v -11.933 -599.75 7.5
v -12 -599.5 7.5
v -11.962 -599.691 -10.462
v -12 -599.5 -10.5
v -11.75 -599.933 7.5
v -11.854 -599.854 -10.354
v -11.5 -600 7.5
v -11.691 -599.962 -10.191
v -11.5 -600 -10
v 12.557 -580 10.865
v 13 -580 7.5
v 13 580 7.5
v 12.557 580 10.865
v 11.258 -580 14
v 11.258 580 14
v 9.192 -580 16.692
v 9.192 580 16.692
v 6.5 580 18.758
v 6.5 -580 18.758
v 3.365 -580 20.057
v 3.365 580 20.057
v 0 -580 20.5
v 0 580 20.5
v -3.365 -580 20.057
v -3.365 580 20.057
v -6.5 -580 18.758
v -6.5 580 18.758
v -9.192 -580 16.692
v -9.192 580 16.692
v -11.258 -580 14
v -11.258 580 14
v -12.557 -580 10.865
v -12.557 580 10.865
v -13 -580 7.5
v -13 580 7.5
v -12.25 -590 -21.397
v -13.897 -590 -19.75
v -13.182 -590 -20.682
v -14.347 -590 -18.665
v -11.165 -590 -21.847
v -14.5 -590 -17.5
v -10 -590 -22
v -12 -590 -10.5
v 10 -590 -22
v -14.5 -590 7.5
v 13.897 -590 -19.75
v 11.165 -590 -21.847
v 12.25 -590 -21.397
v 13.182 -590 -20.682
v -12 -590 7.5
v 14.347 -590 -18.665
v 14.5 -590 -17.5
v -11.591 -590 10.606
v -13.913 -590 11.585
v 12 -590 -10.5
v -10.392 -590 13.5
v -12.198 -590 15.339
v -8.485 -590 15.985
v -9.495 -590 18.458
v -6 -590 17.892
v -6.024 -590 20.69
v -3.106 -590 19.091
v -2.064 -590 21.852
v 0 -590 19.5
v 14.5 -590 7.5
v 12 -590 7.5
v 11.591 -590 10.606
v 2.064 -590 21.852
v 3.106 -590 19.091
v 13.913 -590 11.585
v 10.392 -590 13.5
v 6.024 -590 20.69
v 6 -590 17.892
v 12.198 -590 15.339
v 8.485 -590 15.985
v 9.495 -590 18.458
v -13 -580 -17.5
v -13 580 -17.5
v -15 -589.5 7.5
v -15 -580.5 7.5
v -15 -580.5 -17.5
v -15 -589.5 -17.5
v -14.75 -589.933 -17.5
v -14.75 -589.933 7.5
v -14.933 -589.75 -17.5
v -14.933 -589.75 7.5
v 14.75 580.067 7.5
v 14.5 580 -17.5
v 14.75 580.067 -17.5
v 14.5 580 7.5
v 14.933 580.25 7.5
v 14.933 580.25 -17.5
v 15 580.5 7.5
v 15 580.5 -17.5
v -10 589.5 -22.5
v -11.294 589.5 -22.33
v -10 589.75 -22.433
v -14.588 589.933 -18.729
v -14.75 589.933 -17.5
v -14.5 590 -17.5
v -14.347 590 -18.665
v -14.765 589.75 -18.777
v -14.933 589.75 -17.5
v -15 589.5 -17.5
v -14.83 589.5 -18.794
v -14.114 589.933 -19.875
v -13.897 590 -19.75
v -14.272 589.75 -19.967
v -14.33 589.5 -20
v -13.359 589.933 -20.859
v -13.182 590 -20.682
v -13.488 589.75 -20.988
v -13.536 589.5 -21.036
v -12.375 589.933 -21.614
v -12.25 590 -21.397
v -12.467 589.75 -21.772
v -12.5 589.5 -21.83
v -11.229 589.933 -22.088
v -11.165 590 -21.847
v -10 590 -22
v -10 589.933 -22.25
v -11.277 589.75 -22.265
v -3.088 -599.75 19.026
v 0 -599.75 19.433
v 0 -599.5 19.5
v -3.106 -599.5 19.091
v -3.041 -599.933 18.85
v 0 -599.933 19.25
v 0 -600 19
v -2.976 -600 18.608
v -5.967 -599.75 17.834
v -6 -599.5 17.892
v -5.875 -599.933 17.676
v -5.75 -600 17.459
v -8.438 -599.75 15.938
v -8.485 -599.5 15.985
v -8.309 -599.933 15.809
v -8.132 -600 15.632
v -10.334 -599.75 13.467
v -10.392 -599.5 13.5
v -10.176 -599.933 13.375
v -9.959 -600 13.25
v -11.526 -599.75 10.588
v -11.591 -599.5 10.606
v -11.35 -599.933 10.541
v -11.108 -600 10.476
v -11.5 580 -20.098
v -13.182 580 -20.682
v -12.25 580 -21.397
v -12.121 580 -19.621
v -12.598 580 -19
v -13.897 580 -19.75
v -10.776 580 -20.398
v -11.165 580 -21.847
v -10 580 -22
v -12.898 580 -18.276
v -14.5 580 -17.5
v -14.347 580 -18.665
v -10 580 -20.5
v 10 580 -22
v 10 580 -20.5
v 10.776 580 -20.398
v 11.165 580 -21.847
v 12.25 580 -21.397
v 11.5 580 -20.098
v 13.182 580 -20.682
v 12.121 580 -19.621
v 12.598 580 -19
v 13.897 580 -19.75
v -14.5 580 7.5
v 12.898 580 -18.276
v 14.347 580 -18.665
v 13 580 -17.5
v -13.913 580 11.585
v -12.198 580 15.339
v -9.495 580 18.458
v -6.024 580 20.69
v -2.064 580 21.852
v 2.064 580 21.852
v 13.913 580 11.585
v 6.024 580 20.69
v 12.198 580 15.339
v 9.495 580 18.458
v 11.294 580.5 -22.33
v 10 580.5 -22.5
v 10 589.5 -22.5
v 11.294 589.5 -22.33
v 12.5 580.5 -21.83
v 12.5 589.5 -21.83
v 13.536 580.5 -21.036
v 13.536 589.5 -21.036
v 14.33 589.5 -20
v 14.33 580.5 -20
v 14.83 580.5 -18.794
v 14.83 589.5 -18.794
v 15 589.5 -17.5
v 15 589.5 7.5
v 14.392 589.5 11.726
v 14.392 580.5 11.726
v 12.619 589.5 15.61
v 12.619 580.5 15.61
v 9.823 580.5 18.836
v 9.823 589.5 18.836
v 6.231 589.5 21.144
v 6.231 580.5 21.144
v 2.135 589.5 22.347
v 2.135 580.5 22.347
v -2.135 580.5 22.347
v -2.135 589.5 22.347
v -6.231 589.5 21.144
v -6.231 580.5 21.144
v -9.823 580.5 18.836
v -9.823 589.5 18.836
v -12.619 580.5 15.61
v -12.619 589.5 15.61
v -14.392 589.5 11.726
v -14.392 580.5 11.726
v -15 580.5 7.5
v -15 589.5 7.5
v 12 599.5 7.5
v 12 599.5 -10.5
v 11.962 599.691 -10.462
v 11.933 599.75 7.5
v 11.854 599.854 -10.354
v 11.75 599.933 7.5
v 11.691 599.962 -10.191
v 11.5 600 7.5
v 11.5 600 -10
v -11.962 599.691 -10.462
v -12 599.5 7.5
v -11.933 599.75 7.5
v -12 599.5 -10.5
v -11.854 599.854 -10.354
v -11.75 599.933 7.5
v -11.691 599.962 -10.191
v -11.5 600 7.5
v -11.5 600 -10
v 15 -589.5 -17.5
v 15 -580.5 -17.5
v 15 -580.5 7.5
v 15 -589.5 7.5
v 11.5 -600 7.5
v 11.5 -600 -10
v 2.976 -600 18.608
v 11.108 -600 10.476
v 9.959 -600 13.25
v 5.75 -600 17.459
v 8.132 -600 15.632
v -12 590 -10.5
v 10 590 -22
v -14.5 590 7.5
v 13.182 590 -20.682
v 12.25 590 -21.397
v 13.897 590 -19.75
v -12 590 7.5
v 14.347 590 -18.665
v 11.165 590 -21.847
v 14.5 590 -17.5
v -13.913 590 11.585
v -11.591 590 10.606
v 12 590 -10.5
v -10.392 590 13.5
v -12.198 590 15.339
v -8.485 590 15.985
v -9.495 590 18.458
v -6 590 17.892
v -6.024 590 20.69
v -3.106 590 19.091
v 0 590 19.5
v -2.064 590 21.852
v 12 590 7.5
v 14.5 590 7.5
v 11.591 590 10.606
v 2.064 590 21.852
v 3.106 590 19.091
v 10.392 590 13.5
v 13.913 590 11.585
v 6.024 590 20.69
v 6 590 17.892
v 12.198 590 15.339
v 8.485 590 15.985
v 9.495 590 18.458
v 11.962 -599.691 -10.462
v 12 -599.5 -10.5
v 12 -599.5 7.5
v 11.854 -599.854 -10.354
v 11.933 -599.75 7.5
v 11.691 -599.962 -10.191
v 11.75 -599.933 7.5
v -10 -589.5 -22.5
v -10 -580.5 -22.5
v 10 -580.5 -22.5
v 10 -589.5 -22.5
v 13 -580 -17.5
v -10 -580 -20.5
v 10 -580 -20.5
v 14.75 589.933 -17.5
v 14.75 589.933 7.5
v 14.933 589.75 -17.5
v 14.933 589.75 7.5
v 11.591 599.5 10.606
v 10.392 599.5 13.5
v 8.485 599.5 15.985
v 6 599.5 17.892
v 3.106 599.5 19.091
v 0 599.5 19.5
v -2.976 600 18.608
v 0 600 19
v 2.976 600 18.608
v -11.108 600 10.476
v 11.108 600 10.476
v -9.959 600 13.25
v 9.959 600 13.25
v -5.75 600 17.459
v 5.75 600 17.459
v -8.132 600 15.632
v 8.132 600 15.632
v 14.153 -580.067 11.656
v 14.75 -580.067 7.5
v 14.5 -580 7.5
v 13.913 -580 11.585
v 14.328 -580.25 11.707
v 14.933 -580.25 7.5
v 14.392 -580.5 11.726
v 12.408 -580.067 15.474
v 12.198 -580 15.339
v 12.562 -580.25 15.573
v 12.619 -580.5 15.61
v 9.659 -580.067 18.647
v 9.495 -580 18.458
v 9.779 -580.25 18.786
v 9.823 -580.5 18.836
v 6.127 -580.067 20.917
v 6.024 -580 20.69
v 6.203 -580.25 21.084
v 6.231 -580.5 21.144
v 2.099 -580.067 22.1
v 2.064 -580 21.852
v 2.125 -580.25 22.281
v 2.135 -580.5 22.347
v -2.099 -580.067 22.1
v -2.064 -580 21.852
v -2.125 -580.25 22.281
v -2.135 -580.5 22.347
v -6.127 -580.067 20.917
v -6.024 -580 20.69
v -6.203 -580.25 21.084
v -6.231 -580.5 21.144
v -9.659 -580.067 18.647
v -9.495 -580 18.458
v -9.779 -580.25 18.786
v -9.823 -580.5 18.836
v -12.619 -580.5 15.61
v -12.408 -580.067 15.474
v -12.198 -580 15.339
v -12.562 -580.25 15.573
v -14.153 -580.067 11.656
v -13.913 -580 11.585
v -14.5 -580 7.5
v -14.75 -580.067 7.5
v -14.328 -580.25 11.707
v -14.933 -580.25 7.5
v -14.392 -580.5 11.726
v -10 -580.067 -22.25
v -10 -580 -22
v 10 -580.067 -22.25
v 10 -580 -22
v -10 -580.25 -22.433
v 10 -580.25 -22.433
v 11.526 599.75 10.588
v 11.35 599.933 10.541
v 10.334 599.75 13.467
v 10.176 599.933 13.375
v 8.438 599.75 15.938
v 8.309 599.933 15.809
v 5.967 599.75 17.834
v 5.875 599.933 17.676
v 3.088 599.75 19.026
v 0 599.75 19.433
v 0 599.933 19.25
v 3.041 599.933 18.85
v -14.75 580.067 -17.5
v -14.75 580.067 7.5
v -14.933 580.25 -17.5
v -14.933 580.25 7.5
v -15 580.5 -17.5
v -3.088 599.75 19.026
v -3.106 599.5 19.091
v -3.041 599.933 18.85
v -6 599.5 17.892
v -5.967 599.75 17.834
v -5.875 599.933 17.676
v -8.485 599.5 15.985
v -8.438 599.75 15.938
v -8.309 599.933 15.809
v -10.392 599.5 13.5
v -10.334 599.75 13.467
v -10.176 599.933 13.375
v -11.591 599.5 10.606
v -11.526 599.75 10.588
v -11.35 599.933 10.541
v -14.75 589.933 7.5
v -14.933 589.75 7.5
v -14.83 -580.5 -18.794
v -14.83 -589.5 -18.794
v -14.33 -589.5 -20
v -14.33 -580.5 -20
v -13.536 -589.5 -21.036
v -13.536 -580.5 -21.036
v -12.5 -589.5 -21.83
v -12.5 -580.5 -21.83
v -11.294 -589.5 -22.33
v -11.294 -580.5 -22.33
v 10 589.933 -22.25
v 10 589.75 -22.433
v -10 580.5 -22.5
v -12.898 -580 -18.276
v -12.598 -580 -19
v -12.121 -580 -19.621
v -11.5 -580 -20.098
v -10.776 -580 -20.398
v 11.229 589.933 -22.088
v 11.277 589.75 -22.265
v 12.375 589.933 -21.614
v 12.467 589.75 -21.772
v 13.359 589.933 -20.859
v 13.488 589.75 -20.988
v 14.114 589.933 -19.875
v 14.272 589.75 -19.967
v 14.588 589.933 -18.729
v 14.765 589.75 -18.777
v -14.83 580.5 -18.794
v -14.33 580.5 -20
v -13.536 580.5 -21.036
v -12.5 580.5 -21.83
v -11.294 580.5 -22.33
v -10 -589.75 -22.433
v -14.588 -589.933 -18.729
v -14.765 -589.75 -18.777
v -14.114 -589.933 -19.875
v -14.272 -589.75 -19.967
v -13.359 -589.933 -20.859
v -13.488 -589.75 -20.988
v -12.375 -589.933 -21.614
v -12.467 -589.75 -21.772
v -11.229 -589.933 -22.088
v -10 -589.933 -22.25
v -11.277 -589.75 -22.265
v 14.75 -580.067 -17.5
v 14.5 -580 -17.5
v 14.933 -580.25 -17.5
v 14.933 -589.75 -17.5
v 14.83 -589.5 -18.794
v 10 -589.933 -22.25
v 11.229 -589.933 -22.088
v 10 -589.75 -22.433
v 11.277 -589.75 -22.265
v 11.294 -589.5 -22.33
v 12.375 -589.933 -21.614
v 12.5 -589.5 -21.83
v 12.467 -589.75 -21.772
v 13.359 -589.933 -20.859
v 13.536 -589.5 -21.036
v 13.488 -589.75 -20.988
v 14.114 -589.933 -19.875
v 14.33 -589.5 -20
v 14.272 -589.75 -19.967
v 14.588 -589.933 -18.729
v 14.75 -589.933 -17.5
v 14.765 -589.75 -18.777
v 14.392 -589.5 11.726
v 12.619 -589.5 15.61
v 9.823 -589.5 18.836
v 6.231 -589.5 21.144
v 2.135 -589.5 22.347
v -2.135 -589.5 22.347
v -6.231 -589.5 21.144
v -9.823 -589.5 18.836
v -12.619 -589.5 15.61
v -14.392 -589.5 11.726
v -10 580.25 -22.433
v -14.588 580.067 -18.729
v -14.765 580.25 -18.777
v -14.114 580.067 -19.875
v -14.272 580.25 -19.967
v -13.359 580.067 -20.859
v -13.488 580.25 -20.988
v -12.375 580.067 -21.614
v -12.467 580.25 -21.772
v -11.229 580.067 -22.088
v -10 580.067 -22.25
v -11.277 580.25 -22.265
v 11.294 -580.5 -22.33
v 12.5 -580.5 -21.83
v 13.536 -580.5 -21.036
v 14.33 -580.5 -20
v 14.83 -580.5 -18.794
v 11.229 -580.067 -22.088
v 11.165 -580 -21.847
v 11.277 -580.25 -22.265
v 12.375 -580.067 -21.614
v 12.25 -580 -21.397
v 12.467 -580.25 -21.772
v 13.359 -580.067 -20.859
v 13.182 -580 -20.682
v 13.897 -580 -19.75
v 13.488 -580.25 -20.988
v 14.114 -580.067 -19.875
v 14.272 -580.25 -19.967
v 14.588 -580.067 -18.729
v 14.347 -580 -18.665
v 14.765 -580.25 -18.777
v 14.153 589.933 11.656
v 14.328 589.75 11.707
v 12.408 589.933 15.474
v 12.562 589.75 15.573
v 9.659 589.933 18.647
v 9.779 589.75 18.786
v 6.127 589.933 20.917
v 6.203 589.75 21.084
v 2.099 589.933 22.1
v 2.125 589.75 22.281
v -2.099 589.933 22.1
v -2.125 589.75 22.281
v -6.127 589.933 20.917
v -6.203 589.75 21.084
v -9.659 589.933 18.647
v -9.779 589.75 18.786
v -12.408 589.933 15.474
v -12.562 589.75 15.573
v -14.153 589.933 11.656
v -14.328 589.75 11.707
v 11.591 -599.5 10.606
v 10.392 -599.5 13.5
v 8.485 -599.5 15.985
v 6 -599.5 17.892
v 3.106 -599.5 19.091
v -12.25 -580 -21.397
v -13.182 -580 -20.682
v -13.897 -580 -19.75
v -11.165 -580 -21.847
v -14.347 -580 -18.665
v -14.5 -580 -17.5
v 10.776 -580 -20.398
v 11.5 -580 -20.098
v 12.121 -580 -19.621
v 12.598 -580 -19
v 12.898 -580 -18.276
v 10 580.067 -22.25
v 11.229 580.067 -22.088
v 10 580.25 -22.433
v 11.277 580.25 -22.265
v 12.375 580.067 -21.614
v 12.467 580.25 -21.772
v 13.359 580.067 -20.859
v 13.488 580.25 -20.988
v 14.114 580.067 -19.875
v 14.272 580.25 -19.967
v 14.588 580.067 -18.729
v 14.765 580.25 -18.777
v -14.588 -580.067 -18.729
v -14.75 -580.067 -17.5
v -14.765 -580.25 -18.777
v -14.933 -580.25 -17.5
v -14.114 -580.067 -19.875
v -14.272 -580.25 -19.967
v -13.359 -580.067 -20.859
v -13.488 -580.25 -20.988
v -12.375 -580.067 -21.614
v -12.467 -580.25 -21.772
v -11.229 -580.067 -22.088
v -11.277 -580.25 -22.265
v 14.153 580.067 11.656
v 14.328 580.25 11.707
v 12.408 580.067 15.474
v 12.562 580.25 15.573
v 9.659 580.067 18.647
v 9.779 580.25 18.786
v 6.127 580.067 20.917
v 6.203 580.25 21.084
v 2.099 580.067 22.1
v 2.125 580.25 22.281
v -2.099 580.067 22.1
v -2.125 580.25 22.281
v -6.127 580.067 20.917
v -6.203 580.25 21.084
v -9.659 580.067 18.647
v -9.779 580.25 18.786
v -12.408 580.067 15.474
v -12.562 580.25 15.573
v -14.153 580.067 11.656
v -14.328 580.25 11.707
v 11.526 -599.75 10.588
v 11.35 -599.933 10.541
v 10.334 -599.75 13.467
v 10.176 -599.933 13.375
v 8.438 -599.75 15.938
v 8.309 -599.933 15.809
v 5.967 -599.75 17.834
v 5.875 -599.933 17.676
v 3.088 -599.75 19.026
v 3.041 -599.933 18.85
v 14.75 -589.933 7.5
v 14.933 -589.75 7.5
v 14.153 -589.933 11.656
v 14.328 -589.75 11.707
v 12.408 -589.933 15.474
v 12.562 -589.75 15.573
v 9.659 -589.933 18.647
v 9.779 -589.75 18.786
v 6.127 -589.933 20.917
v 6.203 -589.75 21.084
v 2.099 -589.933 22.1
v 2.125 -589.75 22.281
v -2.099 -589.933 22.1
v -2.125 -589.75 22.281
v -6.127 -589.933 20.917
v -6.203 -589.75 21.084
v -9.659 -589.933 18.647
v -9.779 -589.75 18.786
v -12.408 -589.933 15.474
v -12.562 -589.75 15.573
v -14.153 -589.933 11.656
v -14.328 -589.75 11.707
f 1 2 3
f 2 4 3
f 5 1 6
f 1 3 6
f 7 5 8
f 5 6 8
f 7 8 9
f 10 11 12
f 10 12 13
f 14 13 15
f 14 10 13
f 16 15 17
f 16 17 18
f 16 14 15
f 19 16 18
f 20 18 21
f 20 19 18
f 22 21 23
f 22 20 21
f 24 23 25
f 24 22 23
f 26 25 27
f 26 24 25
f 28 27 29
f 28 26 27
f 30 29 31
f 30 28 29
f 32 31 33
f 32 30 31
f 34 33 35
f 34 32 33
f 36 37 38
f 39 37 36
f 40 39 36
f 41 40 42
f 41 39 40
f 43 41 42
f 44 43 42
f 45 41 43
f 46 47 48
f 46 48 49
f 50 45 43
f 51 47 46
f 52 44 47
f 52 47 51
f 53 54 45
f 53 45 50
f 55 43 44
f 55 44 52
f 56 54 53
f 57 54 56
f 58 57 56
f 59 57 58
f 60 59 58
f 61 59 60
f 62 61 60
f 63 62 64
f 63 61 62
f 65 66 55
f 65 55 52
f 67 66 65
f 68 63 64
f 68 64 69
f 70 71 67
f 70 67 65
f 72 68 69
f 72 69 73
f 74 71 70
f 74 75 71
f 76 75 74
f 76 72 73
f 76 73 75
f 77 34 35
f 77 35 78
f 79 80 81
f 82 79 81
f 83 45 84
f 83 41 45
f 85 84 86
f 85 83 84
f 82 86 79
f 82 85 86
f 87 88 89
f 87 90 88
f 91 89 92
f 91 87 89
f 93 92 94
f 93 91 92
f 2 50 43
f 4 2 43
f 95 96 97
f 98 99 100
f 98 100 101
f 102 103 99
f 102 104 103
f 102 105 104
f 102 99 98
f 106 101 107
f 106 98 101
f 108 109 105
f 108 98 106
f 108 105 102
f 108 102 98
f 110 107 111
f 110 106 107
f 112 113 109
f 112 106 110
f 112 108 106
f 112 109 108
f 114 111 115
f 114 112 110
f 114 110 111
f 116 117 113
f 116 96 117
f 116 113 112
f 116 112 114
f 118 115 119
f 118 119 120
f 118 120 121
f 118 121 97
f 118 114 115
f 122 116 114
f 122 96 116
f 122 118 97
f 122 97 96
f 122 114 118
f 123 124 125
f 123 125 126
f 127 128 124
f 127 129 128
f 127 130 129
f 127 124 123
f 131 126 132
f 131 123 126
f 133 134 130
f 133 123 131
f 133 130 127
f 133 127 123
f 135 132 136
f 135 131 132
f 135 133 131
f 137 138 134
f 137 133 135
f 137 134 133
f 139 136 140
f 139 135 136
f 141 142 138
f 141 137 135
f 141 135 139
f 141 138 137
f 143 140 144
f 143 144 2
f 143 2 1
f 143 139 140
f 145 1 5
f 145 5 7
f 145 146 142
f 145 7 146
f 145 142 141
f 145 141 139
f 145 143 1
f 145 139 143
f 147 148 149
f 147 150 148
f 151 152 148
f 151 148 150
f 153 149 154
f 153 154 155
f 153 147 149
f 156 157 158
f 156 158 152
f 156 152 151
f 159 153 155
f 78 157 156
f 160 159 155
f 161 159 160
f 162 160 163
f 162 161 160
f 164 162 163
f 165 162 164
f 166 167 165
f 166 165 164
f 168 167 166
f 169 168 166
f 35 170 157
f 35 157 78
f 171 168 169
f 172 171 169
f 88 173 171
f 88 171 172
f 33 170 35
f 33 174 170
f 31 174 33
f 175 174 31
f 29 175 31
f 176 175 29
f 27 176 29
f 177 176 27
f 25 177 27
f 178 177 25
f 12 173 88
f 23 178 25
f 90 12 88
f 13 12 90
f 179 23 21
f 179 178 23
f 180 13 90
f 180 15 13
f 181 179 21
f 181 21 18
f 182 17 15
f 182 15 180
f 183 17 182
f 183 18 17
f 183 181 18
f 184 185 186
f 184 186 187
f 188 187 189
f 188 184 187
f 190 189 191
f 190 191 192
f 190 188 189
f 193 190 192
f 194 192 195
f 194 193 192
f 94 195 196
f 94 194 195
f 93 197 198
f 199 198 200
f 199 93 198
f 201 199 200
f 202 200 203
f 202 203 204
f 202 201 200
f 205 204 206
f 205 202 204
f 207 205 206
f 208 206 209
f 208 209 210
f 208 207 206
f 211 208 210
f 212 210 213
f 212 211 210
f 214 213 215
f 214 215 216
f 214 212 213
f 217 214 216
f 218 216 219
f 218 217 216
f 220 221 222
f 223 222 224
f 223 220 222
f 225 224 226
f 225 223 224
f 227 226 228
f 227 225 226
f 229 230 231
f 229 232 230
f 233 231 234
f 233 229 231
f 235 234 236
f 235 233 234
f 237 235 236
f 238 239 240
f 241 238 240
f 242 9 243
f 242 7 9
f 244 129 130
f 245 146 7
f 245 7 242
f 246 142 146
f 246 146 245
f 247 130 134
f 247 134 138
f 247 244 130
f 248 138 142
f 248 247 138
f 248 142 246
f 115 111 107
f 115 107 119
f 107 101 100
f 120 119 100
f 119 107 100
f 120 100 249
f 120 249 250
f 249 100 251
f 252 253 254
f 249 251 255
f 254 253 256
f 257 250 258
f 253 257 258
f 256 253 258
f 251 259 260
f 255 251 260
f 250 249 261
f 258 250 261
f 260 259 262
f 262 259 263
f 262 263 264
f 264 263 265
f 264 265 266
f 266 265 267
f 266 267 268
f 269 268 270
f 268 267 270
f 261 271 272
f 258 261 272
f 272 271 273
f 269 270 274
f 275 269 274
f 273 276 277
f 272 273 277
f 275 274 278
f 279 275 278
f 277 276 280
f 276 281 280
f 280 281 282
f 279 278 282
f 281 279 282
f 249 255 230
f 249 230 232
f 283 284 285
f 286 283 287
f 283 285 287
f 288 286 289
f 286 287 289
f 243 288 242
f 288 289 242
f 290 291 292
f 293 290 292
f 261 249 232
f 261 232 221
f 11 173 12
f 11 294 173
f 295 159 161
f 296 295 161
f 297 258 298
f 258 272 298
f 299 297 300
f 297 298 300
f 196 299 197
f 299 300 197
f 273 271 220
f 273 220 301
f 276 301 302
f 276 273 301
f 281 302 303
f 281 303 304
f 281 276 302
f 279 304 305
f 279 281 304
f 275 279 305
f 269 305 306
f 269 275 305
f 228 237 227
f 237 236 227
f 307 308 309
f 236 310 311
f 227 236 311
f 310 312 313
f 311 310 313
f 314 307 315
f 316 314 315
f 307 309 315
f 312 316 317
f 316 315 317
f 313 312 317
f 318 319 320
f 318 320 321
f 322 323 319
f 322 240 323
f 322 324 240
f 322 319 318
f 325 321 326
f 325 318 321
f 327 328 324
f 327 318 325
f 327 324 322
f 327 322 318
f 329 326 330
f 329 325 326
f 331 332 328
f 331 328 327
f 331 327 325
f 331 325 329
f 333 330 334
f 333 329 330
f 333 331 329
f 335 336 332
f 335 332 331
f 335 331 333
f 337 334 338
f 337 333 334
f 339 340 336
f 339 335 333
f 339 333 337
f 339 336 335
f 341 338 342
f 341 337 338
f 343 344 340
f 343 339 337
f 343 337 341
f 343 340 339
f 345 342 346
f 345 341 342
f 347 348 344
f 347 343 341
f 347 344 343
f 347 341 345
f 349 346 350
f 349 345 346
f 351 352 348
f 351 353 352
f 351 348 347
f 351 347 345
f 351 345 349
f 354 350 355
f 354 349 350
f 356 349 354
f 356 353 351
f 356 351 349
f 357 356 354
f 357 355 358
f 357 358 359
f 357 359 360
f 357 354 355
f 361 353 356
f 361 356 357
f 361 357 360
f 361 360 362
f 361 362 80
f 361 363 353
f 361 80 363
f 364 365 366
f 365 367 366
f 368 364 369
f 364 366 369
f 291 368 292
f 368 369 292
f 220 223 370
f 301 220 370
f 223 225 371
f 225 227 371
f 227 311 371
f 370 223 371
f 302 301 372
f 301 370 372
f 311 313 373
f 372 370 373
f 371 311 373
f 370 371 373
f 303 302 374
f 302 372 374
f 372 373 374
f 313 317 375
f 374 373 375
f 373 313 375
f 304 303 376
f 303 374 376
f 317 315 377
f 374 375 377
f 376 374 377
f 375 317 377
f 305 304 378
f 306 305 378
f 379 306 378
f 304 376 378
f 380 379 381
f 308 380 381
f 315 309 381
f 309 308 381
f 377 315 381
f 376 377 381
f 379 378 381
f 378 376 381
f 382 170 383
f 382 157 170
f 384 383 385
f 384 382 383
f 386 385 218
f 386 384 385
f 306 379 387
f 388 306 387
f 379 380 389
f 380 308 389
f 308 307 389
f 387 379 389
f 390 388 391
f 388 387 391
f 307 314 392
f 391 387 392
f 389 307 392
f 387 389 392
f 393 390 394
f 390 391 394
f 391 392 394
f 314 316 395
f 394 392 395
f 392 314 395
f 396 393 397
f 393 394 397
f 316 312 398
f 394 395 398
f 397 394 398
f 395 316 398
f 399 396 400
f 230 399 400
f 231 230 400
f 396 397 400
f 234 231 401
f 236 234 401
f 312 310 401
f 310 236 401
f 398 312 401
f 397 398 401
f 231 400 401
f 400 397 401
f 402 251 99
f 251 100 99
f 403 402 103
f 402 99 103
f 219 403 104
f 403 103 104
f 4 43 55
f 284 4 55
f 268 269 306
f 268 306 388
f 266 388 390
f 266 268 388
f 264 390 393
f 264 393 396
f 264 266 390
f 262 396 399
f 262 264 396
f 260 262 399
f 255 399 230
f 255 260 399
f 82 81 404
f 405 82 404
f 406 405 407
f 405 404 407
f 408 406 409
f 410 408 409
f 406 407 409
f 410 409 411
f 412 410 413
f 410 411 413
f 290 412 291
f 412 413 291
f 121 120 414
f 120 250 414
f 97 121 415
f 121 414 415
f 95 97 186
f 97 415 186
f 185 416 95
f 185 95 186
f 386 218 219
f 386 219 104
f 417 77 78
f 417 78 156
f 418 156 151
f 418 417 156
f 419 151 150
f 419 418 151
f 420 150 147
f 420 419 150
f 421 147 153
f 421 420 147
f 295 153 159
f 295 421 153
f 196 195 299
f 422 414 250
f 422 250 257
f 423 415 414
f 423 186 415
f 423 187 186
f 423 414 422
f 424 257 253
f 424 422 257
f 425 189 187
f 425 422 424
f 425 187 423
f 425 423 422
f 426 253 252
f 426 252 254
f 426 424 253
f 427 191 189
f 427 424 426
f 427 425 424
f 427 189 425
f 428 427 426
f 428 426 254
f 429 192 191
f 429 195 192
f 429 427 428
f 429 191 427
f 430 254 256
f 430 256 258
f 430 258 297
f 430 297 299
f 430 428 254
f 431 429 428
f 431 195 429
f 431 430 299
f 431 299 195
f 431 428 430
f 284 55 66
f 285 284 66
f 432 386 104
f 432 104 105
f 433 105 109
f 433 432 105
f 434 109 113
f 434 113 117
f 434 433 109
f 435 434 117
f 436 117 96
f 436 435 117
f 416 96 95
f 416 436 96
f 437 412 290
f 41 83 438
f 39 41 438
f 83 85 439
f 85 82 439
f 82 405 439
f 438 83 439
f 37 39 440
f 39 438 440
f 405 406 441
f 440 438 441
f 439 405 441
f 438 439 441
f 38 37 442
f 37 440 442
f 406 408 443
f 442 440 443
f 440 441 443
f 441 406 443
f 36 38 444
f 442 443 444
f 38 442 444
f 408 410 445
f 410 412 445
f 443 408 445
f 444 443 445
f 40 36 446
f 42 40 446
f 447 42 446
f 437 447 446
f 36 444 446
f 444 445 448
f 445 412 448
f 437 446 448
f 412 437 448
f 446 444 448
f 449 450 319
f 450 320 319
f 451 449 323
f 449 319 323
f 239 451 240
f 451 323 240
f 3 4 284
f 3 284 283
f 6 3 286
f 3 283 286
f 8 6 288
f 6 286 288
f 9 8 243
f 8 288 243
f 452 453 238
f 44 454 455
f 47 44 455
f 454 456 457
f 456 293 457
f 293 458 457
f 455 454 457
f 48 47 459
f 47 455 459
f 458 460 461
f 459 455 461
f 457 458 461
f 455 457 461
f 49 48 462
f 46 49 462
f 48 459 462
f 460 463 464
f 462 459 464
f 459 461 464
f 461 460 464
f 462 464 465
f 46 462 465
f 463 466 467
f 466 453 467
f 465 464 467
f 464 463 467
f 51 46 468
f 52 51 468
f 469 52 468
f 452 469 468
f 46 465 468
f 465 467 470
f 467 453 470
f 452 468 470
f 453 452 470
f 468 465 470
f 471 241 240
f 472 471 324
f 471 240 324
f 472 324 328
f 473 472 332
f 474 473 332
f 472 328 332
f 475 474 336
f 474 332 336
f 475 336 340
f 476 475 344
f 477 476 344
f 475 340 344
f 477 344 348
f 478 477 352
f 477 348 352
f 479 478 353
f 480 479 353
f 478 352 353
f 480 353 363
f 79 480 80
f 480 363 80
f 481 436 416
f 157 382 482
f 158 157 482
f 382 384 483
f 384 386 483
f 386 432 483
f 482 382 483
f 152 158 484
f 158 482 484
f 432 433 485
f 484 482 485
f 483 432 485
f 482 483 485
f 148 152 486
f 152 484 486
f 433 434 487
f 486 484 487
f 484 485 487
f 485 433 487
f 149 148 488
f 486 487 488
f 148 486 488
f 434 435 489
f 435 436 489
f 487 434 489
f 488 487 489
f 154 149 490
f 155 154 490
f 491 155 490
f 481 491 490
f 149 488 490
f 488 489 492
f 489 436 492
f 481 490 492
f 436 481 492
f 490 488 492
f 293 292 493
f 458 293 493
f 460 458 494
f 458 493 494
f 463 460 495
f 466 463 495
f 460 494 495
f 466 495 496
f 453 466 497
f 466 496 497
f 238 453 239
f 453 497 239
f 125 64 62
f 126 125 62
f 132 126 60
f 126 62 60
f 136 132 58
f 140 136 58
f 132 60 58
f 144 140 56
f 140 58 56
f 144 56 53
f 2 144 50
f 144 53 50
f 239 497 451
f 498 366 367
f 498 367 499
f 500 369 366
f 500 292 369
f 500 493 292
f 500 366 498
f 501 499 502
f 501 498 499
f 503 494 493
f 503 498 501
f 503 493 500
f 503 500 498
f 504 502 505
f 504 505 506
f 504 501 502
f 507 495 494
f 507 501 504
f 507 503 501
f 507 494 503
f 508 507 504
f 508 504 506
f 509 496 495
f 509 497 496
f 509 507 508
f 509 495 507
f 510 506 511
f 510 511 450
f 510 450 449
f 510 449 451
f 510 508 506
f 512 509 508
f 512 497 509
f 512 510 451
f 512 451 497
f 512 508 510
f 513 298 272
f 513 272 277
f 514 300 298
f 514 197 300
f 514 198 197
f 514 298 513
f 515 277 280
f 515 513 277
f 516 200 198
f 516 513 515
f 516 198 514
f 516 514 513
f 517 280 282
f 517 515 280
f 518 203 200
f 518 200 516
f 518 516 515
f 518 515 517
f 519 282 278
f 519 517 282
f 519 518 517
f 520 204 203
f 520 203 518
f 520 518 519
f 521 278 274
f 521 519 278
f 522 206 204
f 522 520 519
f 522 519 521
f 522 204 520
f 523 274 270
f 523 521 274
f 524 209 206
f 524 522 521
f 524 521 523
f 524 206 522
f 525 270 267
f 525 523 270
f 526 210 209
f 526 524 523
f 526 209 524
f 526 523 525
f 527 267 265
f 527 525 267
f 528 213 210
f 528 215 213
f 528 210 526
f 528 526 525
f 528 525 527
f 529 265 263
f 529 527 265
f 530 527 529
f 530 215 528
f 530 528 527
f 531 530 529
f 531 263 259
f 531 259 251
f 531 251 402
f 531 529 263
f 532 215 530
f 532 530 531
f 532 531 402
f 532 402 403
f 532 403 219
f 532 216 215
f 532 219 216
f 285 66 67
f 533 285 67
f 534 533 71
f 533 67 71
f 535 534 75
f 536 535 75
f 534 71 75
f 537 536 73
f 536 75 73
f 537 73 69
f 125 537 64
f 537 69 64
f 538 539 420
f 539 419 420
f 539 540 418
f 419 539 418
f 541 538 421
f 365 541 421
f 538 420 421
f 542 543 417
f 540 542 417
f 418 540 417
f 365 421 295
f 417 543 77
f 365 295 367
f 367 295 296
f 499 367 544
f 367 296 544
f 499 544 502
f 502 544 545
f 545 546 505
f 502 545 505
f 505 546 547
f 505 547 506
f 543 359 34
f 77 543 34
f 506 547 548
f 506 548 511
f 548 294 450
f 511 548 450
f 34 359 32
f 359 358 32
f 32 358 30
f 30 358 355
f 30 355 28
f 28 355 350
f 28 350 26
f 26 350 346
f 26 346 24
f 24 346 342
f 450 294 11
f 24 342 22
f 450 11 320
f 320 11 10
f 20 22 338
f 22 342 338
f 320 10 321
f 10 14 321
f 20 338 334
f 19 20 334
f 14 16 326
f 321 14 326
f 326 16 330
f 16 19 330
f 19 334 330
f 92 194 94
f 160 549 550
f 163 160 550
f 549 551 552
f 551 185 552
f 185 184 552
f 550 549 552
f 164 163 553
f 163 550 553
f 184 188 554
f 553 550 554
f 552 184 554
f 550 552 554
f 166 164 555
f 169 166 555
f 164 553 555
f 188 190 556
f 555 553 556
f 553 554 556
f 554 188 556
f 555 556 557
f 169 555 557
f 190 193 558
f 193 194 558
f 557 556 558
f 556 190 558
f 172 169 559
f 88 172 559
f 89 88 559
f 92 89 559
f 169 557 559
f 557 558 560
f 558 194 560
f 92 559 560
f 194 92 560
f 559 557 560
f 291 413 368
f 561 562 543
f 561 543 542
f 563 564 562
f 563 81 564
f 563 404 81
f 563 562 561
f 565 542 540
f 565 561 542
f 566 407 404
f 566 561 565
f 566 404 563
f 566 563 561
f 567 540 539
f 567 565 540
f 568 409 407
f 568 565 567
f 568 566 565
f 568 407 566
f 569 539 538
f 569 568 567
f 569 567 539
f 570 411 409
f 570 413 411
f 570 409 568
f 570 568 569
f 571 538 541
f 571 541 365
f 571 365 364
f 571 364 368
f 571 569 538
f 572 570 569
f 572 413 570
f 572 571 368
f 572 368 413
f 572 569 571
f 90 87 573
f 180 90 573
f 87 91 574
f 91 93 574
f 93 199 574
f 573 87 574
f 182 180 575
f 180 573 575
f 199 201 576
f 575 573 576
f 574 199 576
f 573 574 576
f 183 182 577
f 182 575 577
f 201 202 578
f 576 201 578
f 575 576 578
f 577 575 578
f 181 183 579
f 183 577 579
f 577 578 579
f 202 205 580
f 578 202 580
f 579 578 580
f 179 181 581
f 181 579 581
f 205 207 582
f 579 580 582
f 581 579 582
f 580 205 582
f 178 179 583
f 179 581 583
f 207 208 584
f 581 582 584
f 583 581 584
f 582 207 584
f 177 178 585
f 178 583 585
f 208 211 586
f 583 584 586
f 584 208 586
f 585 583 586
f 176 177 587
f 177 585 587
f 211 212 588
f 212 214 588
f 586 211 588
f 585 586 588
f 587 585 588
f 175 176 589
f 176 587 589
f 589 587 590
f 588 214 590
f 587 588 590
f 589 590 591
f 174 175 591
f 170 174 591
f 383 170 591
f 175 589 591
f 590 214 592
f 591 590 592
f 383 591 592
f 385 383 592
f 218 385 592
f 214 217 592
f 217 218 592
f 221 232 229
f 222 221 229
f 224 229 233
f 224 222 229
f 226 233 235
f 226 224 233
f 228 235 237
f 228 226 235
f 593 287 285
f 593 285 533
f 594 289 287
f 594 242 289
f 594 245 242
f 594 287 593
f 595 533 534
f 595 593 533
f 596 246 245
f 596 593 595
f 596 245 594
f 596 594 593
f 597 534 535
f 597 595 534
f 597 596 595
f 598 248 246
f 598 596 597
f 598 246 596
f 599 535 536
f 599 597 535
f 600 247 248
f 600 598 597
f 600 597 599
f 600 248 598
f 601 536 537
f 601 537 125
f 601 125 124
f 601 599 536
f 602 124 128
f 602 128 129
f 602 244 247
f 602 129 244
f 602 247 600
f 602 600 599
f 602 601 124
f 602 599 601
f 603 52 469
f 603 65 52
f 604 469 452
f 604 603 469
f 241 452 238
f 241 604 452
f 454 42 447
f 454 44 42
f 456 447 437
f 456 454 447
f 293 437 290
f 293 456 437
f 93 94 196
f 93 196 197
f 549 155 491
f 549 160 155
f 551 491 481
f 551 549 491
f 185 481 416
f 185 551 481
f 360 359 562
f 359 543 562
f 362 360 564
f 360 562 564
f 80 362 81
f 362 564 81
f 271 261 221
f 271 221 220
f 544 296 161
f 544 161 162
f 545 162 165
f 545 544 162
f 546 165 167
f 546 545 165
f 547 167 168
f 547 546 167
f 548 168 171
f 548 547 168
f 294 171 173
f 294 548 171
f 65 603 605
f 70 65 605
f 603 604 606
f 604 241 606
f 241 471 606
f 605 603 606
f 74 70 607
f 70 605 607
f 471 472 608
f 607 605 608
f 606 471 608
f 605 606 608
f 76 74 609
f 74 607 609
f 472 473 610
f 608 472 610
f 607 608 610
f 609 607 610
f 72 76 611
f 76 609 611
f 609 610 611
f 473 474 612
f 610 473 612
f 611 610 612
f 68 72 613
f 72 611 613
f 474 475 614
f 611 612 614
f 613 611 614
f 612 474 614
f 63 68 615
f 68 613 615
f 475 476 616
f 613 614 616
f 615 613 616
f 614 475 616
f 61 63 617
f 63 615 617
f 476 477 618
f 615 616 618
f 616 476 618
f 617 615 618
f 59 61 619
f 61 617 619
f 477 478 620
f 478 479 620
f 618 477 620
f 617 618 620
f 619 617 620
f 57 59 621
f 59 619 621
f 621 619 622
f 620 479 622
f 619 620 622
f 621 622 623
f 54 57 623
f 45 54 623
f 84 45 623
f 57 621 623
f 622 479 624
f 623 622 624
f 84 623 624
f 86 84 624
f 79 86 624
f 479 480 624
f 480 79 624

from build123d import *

# Parameters (mm, degrees)
F1_DEPTH = 580
F3_DEPTH = 10
F5_DEPTH = 10
F6_R     = 0.5


with BuildPart() as f1:
    # F0 (on Front) → F1 (new body)
    with BuildSketch(Plane.XZ):
        with BuildLine():
            Line((13, -17.5), (13, 7.5))
            ThreePointArc((13, 7.5), (9.1923881554, 16.6923881554), (0, 20.5))
            ThreePointArc((0, 20.5), (-9.1923881554, 16.6923881554), (-13, 7.5))
            Line((-13, 7.5), (-13, -17.5))
            ThreePointArc((-13, -17.5), (-12.1213203436, -19.6213203436), (-10, -20.5))
            Line((-10, -20.5), (10, -20.5))
            ThreePointArc((10, -20.5), (12.1213203436, -19.6213203436), (13, -17.5))
        make_face()
        with BuildLine():
            ThreePointArc((0, 19.5), (8.4852813742, 15.9852813742), (12, 7.5))
            Line((12, 7.5), (12, -10.5))
            Line((12, -10.5), (0, -10.5))
            Line((0, -10.5), (-12, -10.5))
            Line((-12, -10.5), (-12, 7.5))
            ThreePointArc((-12, 7.5), (-8.4852813742, 15.9852813742), (0, 19.5))
        make_face(mode=Mode.SUBTRACT)
        with BuildLine():
            Line((12, -10.5), (12, 7.5))
            ThreePointArc((12, 7.5), (8.4852813742, 15.9852813742), (0, 19.5))
            ThreePointArc((0, 19.5), (-8.4852813742, 15.9852813742), (-12, 7.5))
            Line((-12, 7.5), (-12, -10.5))
            Line((-12, -10.5), (0, -10.5))
            Line((0, -10.5), (12, -10.5))
        make_face()
    extrude(amount=F1_DEPTH)

    # F2 (on face) → F3 (join)
    with BuildSketch(Plane.XZ.offset(580)):
        with BuildLine():
            ThreePointArc((10, -22.5), (13.5355339059, -21.0355339059), (15, -17.5))
            Line((15, -17.5), (15, 7.5))
            ThreePointArc((15, 7.5), (10.6066017178, 18.1066017178), (0, 22.5))
            ThreePointArc((0, 22.5), (-10.6066017178, 18.1066017178), (-15, 7.5))
            Line((-15, 7.5), (-15, -17.5))
            ThreePointArc((-15, -17.5), (-13.5355339059, -21.0355339059), (-10, -22.5))
            Line((-10, -22.5), (10, -22.5))
        make_face()
    extrude(amount=F3_DEPTH)

    # F4 (on face) → F5 (join)
    with BuildSketch(Plane.XZ.offset(590)):
        with BuildLine():
            Line((-12, 7.5), (-12, -10.5))
            Line((-12, -10.5), (0, -10.5))
            Line((0, -10.5), (12, -10.5))
            Line((12, -10.5), (12, 7.5))
            ThreePointArc((12, 7.5), (8.4852813742, 15.9852813742), (0, 19.5))
            ThreePointArc((0, 19.5), (-8.4852813742, 15.9852813742), (-12, 7.5))
        make_face()
    extrude(amount=F5_DEPTH)

    # F6
    f6_edges = [f1.edges().sort_by_distance(p)[0] for p in [
        (0, -600, -10.5),
        (-12, -600, -1.5),
        (-15, -590, -5),
        (0, -590, 22.5),
        (-15, -580, -5),
    ]]
    fillet(f6_edges, radius=F6_R)

    # F7: F1 across plane


with BuildPart() as f1_1:
    add(f1.part)
    add(f1.part.mirror(Plane.XZ))

    # F8: F1 across plane


with BuildPart() as f1_2:
    add(f1_1.part)
    add(f1_1.part.mirror(Plane.XZ))


solid = f1_2.part
